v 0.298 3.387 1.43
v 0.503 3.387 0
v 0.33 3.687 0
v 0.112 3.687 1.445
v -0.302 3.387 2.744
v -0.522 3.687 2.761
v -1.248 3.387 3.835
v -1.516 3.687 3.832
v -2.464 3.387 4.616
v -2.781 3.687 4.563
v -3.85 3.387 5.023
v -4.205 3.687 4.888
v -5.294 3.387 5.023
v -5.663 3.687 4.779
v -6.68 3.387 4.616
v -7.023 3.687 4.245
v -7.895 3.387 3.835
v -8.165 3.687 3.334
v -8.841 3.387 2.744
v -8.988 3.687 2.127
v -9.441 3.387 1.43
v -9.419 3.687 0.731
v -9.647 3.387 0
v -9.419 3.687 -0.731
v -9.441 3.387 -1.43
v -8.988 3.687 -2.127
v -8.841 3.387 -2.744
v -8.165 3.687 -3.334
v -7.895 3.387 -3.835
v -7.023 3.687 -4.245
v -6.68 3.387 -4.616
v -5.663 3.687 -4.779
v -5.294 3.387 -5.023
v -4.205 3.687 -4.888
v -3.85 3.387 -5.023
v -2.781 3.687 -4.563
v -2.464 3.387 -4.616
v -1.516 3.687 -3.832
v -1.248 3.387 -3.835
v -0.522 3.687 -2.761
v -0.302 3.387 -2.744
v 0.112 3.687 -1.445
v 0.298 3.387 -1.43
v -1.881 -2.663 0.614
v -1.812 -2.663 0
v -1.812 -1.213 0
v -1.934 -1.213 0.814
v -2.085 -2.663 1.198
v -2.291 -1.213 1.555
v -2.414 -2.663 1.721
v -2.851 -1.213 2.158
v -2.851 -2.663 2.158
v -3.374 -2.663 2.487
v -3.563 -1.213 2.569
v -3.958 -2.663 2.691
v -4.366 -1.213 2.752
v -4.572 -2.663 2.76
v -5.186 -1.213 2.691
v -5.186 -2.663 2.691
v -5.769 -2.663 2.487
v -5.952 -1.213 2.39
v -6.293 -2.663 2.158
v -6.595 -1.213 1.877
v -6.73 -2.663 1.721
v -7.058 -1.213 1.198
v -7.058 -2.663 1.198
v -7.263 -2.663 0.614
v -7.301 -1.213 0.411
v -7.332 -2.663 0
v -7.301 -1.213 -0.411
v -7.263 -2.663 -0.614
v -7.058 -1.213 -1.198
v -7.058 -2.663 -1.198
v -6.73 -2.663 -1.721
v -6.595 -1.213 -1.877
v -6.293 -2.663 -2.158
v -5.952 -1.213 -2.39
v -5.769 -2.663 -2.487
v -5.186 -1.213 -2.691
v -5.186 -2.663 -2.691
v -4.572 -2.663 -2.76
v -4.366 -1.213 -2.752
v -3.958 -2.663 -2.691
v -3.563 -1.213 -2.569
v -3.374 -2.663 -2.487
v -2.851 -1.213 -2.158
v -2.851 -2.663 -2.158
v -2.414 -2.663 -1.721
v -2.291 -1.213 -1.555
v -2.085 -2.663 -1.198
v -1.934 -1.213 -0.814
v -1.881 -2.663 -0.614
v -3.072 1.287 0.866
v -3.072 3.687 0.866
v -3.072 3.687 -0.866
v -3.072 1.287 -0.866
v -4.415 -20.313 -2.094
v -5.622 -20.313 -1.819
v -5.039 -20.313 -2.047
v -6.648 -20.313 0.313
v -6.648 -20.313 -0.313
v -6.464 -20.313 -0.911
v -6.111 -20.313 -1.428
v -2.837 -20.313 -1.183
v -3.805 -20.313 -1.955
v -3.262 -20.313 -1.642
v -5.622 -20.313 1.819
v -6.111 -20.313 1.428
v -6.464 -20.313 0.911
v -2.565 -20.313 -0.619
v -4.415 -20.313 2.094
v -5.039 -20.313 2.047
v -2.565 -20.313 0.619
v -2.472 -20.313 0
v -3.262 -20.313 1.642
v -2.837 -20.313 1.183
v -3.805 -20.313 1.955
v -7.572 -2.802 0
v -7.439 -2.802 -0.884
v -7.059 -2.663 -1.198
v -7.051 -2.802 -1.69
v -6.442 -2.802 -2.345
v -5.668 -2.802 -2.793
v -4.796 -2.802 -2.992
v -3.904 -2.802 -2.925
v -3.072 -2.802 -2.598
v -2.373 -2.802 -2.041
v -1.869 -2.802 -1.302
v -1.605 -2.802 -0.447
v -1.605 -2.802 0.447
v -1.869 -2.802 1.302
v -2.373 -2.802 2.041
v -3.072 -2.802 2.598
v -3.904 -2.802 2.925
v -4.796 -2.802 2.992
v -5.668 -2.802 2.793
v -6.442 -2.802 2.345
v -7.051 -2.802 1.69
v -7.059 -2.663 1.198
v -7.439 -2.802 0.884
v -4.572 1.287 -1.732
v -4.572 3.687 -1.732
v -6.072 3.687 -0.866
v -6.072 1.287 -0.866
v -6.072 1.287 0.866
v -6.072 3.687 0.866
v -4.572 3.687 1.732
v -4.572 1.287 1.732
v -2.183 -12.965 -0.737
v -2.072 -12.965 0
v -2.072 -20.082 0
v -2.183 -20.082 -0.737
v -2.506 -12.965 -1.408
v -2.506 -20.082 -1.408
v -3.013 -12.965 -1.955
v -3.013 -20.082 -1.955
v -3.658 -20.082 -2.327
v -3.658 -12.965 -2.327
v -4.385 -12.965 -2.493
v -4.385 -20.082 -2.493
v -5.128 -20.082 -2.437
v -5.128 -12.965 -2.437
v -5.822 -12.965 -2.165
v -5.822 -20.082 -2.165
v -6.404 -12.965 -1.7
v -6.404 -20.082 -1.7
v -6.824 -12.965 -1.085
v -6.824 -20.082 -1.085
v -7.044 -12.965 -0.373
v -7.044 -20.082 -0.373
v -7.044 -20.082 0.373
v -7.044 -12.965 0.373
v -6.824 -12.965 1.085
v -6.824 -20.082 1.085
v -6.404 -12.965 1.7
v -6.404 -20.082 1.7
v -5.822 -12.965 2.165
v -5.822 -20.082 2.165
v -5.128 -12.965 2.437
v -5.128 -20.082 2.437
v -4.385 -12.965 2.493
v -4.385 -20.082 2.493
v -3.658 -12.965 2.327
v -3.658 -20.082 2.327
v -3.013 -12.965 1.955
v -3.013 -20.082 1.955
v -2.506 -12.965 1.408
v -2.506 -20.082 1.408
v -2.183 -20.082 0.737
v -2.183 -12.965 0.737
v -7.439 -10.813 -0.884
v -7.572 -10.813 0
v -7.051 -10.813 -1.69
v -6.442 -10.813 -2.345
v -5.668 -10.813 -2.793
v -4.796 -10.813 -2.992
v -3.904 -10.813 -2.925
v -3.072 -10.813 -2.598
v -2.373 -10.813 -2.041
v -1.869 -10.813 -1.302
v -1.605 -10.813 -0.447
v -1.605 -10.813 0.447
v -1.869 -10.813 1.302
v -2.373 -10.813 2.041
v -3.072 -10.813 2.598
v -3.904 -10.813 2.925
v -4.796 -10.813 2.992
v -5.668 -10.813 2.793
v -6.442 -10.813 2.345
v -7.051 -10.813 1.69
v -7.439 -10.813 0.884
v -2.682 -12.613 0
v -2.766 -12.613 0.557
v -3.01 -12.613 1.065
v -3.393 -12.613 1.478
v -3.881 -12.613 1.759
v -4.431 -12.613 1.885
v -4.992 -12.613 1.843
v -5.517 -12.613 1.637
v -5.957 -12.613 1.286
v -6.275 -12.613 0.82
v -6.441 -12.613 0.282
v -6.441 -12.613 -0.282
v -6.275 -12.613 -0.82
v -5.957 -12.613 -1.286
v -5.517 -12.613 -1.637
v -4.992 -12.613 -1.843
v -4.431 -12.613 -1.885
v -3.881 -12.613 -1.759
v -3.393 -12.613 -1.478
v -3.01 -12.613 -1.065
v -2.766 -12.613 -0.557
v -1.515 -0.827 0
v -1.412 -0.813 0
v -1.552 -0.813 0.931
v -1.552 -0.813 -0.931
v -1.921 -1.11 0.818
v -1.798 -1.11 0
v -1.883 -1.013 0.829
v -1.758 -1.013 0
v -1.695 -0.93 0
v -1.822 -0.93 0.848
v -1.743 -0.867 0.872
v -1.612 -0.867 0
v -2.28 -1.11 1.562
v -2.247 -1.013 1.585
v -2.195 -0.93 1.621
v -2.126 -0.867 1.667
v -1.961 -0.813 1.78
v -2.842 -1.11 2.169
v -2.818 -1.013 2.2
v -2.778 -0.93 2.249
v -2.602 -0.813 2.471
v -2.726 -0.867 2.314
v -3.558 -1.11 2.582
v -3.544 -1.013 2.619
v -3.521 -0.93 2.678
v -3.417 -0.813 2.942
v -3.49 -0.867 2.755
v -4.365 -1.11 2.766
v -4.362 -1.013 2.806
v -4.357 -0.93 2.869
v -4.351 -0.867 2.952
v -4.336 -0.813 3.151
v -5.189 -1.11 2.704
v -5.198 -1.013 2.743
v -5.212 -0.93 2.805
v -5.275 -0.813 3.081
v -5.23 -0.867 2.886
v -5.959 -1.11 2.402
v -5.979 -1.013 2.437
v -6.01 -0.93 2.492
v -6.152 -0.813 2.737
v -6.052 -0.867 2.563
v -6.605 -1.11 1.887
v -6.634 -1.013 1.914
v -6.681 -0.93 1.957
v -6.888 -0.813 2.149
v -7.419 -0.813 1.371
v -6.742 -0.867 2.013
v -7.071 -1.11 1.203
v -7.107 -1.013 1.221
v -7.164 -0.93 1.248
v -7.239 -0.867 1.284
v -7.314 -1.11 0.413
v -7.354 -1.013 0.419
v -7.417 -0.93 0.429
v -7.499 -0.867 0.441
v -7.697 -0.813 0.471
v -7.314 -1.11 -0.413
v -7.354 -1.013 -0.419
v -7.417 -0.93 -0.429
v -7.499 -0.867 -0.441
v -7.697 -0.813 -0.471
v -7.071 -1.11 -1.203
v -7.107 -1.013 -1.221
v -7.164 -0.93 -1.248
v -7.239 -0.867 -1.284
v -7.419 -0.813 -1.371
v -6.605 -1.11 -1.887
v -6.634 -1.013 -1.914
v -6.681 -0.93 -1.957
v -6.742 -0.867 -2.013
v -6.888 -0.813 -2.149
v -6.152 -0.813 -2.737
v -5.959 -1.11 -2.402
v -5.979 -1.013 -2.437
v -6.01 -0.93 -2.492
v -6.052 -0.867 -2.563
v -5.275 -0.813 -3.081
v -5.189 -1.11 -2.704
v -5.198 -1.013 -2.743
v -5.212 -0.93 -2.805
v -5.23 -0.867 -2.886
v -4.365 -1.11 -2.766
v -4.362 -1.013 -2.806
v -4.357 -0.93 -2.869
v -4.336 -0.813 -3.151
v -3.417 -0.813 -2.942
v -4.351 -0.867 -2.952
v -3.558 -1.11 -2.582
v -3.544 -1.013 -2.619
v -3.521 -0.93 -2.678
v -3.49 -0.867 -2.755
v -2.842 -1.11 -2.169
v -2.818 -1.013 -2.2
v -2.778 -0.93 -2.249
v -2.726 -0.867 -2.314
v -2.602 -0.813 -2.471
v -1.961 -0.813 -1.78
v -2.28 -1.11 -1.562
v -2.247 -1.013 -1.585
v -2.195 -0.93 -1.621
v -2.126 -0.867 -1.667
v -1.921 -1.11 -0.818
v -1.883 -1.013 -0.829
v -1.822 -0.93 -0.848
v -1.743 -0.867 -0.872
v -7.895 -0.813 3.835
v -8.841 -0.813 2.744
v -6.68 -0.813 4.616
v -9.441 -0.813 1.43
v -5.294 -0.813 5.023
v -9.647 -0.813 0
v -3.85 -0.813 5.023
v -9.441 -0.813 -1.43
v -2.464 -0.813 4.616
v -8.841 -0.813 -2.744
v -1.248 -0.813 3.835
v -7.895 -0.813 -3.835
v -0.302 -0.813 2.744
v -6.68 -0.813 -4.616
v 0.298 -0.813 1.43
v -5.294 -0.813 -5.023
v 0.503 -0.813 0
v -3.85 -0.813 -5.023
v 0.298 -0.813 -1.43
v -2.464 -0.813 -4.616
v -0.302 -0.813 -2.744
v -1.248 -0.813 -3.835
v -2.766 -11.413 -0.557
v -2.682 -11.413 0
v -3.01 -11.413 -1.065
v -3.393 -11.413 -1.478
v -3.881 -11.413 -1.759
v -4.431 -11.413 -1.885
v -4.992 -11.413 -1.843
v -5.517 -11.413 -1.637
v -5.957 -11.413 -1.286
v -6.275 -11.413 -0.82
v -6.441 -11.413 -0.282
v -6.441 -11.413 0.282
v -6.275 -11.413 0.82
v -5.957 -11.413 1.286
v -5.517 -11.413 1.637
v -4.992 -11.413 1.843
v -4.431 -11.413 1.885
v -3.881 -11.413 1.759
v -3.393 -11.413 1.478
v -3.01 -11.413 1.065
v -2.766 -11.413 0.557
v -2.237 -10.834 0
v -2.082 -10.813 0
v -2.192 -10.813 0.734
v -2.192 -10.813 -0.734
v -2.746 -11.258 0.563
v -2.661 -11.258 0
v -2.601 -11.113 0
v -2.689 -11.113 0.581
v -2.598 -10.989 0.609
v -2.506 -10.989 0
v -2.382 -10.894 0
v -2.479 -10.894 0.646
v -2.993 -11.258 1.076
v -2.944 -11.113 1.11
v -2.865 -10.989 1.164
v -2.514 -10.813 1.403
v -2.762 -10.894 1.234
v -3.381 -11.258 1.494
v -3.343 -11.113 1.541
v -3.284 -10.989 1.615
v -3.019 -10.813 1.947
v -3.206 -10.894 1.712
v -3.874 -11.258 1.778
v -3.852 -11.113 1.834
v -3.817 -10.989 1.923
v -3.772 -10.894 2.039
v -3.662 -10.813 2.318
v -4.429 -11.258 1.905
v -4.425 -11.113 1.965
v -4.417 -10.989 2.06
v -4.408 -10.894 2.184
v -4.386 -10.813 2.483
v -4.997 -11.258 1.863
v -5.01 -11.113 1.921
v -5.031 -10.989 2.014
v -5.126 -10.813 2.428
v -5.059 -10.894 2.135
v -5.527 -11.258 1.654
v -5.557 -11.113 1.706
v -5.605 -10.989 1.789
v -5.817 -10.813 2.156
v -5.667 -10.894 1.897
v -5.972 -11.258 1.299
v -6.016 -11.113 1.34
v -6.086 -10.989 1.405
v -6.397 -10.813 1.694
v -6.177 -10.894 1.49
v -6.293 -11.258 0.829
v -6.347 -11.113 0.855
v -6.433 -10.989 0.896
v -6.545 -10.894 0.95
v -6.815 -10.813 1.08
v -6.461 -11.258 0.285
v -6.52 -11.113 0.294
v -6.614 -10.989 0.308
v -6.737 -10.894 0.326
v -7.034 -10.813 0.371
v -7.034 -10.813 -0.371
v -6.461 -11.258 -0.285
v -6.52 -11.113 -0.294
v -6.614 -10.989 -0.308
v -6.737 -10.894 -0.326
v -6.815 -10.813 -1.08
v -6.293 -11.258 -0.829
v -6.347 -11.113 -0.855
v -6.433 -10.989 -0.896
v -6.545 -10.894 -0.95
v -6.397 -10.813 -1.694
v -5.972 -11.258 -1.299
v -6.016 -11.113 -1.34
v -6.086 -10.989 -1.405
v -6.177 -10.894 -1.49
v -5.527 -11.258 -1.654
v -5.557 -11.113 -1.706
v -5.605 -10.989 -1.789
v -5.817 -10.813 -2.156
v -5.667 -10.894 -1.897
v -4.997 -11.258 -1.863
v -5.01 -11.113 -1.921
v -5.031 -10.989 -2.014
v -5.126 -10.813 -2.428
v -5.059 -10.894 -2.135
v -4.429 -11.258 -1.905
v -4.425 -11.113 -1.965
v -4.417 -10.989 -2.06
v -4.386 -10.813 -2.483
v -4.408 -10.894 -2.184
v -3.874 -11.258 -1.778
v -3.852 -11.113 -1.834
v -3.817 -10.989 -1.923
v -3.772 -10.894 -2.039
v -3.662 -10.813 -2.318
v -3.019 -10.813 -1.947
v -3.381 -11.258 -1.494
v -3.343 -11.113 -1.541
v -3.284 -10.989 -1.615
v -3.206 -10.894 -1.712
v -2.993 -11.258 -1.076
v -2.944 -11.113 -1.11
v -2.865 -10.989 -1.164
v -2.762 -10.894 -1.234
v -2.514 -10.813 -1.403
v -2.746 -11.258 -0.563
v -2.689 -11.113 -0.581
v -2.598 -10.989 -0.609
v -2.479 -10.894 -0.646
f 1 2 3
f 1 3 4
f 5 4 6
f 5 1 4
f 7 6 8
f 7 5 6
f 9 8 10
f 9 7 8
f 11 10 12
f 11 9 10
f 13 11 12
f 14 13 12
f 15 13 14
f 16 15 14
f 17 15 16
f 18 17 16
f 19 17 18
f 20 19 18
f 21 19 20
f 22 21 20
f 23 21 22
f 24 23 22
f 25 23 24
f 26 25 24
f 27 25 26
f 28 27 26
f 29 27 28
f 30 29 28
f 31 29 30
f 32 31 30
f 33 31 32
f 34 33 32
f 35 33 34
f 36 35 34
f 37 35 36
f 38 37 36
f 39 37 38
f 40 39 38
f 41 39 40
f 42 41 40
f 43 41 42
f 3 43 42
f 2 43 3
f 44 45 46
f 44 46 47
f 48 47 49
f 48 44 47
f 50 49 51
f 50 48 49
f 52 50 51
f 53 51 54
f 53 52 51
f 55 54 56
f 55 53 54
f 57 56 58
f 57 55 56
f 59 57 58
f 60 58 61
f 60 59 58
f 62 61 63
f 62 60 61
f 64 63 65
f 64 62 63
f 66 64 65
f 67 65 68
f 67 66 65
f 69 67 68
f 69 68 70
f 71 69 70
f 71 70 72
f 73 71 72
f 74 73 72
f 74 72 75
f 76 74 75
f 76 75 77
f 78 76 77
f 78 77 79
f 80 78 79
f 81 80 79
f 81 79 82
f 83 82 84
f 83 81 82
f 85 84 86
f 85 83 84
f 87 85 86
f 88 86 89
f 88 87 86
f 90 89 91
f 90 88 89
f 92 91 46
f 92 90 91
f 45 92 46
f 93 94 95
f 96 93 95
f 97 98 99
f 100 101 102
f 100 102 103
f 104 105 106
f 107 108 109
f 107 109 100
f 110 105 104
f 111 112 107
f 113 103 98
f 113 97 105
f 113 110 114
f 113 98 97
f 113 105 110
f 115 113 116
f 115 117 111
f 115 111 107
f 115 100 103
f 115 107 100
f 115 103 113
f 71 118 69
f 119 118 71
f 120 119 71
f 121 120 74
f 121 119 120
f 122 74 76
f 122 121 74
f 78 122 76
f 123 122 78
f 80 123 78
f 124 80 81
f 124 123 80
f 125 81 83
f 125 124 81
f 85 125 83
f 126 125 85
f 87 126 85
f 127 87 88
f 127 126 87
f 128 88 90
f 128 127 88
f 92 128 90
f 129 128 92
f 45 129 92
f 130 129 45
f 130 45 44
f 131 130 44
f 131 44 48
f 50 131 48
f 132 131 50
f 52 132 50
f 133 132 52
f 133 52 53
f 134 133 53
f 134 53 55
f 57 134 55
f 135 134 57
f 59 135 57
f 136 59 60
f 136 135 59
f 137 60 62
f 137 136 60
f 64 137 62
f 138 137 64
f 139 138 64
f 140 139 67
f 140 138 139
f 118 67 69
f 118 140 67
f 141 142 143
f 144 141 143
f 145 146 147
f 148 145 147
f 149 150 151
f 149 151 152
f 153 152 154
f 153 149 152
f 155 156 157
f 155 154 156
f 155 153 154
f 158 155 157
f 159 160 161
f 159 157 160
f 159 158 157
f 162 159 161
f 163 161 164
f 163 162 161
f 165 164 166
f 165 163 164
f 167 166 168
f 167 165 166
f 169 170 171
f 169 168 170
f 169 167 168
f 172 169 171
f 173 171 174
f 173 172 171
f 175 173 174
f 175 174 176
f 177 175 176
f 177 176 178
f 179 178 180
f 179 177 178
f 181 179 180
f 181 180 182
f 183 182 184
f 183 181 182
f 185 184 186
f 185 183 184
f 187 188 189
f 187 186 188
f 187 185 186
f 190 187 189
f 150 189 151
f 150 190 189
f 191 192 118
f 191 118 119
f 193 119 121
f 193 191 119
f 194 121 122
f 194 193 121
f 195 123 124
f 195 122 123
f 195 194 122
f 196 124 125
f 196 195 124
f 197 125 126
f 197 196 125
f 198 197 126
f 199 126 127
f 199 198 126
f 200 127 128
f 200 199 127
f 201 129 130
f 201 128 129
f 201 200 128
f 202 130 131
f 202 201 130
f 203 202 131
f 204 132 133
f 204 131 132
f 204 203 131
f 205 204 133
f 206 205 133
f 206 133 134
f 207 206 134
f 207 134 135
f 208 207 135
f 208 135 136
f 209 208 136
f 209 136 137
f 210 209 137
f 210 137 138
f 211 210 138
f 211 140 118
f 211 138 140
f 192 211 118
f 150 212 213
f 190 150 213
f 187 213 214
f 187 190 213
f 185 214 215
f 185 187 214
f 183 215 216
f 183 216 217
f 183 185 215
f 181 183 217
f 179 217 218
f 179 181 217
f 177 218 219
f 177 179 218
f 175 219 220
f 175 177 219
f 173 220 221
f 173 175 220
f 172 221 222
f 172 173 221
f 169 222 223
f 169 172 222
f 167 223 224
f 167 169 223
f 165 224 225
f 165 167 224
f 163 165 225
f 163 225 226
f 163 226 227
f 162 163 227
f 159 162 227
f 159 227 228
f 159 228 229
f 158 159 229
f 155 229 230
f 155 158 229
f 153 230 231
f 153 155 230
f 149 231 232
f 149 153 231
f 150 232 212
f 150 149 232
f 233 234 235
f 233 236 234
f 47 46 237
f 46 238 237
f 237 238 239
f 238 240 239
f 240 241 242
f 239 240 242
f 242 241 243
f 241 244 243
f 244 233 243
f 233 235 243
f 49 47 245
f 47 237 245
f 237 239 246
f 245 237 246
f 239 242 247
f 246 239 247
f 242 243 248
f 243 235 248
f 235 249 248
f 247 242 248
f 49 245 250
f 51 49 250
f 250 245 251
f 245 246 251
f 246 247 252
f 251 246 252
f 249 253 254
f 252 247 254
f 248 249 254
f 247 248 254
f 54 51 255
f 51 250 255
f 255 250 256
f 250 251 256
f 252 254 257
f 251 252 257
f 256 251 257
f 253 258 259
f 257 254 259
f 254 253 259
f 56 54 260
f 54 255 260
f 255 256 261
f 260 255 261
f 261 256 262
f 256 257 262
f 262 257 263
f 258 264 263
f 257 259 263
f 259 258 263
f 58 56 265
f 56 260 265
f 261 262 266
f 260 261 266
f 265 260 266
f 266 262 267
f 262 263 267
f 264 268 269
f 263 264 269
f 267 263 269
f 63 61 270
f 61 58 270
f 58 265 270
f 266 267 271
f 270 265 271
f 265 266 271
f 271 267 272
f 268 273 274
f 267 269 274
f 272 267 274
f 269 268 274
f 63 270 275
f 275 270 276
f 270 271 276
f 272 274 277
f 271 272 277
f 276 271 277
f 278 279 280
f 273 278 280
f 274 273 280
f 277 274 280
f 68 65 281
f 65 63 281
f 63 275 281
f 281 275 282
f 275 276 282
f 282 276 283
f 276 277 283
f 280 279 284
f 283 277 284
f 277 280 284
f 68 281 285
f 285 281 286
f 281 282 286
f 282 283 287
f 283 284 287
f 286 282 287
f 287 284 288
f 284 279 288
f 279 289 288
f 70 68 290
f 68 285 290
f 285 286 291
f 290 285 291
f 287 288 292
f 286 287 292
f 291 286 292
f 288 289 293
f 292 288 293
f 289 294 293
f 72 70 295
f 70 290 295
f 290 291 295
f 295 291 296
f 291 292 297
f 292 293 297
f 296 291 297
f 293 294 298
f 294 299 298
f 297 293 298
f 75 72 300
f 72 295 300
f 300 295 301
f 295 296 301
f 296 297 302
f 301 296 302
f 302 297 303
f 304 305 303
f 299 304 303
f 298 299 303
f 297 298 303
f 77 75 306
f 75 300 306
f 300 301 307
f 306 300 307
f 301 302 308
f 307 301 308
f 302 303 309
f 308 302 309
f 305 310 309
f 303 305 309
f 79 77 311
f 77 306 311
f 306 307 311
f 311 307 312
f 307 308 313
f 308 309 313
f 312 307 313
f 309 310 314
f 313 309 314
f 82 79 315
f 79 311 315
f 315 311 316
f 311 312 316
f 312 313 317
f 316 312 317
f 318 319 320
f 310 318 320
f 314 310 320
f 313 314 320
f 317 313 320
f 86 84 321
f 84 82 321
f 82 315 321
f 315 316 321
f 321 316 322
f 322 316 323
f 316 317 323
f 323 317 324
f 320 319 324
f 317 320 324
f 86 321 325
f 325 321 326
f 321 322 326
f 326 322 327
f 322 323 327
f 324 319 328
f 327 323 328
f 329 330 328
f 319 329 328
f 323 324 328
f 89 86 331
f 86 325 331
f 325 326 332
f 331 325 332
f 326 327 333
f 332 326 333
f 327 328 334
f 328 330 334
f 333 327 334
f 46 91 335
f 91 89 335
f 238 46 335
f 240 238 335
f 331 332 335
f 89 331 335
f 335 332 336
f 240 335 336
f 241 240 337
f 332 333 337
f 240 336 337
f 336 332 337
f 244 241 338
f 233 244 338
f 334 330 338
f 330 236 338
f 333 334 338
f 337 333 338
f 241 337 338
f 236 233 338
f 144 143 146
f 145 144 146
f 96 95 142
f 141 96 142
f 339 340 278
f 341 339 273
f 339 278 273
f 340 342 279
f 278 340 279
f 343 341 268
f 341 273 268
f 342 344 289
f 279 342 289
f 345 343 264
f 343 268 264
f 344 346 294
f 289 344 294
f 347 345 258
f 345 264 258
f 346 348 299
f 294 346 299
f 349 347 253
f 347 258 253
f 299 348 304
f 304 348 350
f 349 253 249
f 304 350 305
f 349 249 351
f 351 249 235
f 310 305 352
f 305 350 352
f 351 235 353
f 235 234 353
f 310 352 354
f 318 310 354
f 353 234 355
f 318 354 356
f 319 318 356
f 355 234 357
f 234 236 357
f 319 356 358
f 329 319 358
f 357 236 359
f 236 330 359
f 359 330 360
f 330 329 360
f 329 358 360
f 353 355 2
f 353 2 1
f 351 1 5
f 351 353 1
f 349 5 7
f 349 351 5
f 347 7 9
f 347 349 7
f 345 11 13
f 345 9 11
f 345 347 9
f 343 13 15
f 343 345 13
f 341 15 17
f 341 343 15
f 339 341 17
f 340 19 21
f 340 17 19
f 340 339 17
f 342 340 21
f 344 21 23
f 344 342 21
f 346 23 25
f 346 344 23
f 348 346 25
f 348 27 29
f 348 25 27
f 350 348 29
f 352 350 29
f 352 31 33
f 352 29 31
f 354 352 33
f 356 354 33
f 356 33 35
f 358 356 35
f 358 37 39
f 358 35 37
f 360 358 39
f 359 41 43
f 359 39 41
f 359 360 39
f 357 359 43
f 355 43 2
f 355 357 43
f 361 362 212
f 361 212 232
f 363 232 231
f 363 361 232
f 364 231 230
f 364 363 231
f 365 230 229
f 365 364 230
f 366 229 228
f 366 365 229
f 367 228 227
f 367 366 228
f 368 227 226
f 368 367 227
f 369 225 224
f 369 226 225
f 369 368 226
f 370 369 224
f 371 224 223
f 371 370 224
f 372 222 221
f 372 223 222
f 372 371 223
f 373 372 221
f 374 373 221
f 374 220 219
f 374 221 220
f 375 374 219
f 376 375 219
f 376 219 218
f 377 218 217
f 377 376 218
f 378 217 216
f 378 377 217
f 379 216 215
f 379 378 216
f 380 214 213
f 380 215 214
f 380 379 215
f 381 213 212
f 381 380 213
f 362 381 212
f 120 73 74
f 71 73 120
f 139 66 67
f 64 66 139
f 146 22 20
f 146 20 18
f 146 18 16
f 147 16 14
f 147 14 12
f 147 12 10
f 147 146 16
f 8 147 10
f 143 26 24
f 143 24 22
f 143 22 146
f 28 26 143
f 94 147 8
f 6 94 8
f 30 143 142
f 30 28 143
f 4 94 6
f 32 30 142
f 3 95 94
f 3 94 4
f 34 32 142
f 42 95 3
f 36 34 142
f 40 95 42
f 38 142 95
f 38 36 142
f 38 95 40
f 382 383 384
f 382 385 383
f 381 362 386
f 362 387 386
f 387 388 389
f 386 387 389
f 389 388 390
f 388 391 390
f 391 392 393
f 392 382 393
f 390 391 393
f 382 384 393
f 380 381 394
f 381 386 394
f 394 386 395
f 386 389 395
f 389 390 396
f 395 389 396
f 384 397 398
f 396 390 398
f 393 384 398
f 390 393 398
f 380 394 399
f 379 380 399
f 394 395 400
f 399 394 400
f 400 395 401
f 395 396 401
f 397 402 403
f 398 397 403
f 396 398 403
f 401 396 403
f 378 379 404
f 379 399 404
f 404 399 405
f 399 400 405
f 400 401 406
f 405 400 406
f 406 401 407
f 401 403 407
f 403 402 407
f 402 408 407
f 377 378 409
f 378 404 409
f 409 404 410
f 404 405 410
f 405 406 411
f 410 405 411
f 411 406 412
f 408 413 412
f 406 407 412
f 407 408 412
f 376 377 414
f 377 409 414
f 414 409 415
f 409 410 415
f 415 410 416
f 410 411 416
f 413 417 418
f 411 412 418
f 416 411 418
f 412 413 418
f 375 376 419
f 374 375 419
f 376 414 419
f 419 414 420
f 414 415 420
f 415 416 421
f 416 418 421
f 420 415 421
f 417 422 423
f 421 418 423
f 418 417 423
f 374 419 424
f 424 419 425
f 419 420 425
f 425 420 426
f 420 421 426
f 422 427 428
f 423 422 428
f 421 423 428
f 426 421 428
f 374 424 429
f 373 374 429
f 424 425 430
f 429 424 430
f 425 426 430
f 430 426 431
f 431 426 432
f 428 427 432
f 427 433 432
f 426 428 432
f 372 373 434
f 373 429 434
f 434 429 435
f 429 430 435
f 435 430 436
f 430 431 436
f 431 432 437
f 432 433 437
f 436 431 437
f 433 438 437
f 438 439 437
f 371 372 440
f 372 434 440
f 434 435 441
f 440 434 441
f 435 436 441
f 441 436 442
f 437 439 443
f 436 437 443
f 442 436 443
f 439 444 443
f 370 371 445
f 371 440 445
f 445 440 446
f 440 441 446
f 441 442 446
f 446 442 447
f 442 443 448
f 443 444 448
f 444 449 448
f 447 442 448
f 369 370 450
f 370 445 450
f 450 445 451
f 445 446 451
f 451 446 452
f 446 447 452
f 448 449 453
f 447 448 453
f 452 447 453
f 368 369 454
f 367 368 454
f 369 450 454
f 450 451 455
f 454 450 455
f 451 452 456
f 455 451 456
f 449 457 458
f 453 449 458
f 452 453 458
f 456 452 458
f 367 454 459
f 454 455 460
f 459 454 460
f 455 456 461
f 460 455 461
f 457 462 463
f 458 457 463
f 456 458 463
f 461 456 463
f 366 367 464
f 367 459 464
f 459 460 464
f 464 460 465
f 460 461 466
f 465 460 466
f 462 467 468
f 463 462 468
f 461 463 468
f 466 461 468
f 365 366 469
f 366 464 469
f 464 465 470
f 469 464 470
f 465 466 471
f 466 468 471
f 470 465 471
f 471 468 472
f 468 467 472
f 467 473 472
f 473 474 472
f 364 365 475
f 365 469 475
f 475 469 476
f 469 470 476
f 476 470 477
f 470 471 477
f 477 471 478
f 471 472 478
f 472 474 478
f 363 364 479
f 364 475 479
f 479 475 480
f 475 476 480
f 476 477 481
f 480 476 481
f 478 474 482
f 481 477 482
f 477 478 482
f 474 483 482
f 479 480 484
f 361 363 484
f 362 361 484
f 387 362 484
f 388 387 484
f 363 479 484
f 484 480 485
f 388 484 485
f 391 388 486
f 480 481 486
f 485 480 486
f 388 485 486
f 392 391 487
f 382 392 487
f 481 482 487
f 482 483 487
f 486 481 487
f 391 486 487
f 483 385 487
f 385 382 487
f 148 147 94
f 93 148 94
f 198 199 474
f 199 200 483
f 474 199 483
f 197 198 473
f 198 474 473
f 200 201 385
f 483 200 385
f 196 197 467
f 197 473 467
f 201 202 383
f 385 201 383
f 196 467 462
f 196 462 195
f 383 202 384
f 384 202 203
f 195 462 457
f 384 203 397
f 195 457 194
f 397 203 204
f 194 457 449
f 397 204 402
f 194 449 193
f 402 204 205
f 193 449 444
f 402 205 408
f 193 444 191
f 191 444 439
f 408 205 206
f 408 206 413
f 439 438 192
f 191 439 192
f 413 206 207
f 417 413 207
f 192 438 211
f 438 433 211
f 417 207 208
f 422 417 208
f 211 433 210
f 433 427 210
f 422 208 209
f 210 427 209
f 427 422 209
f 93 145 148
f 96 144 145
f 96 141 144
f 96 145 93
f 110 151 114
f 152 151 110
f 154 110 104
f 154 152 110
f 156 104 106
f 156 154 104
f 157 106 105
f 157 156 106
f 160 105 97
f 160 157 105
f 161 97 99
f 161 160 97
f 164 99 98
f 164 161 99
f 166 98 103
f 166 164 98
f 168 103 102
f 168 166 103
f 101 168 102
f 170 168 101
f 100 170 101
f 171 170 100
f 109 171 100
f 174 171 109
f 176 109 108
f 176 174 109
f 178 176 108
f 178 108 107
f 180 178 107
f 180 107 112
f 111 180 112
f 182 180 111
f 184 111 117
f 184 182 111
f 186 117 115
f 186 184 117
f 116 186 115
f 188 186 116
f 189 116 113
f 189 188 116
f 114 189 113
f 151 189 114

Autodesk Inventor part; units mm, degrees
ref_plane "YZ Plane" through (0, 0, 0) normal (1, 0, 0) x (0, 1, 0)
ref_plane "XZ Plane" through (0, 0, 0) normal (0, 1, 0) x (-1, 0, 0)
ref_plane "XY Plane" through (0, 0, 0) normal (0, 0, 1) x (1, 0, 0)
sketch "Sketch1" plane through (0, 0, 0) normal (0, 0, 1) x (1, 0, 0)
  line L0 (-4.5718, -2.6632) -> (-7.5718, -2.6632)
  line L1 (-7.5718, -2.6632) -> (-7.5718, -10.8132)
  line L2 (-7.5718, -10.8132) -> (-4.5718, -10.8132)
  line L3 (-4.5718, -10.8132) -> (-4.5718, -2.6632)
  dimension "d1" = 8.15
  dimension "d2" = 3
revolve "Shoulder" add sketch "Sketch1" angle 360 about axis through (-4.5718, -10.8132, 0) along (0, 1, 0)
sketch "Sketch2" plane through (-4.5718, -2.6632, 0) normal (0, 1, 0) x (1, 0, 0)
  circle A0 centre (0, 0) radius 3 projected
  circle A1 centre (0, 0) radius 2.76
  dimension "d3" = 5.52
extrude "Shoulder_neck" add sketch "Sketch2" along normal blind 1.85 contours A1
sketch "Sketch3" plane through (-4.5718, -0.8132, 0) normal (0, 1, 0) x (1, 0, 0)
  circle A0 centre (0, 0) radius 2.76 projected
  circle A1 centre (0, 0) radius 5.075
  dimension "d6" = 10.15
extrude "Head" add sketch "Sketch3" along normal blind 4.5 contours A0 | A1
sketch "Sketch4" plane through (-4.5718, -10.8132, 0) normal (0, -1, 0) x (1, 0, 0)
  circle A0 centre (0, 0) radius 3 projected
  circle A1 centre (0, 0) radius 1.89
  dimension "d9" = 3.78
extrude "Thread_neck" add sketch "Sketch4" along normal blind 1.8 contours A1
sketch "Sketch5" plane through (-4.5718, -12.6132, 0) normal (0, -1, 0) x (1, 0, 0)
  circle A0 centre (0, 0) radius 1.89 projected
  circle A1 centre (0, 0) radius 2.5
  dimension "d12" = 5
extrude "Thread_shoulder" add sketch "Sketch5" along normal blind 7.7 contours A0 | A1
sketch "Sketch6" plane through (-4.5718, 3.6868, 0) normal (0, 1, 0) x (1, 0, 0)
  circle A0 centre (0, 0) radius 5.075 projected
  circle A1 centre (0, 0) radius 1.5 construction
  line L0 (-1.5, 0.866) -> (-1.5, -0.866)
  line L1 (-1.5, -0.866) -> (0, -1.7321)
  line L2 (0, -1.7321) -> (1.5, -0.866)
  line L3 (1.5, -0.866) -> (1.5, 0.866)
  line L4 (1.5, 0.866) -> (0, 1.7321)
  line L5 (0, 1.7321) -> (-1.5, 0.866)
  dimension "d15" = 3
extrude "Hex" cut sketch "Sketch6" against normal blind 2.4 contours L5 L4 L3 L2 L1 L0
chamfer "Chamfer1" distance 0.24 angle 30 1 edges at (-1.5718, -2.6632, 0) measured on face at (-7.436, -2.6632, -0.4595)
fillet "Fillet1" radius 0.4 1 edges at (-7.3318, -0.8132, 0)
chamfer "Chamfer2" distance 0.3 angle 30 1 edges at (-9.6468, 3.6868, 0) measured on face at (0.4867, 2.1868, 0.4084)
chamfer "Chamfer3" distance 0.4 angle 30 1 edges at (-7.0718, -20.3132, 0) measured on face at (-3.3106, -20.3132, -0.6619)
fillet "Fillet2" radius 0.6 1 edges at (-6.4618, -10.8132, 0)
chamfer "Chamfer7" distance 0.61 angle 30 1 edges at (-7.0718, -12.6132, 0) measured on face at (-2.3177, -12.6132, -0.3502)
thread "Thread" size "M5x0.8" class "6g" standard "ANSI Metric M Profile" full length
equation "\"d1\" = Shoulder_length - Shoulder_neck_length"
equation "\"d2\" = 0.5 * Shoulder_diameter"
equation "\"d3\" = Shoulder_neck_dia"
equation "\"d4\" = Shoulder_neck_length"
equation "\"d6\" = Head_diameter"
equation "\"d7\" = Head_height"
equation "\"d9\" = Thread_neck_dia"
equation "\"d10\" = Thread_neck_length"
equation "\"d12\" = Thread_diameter"
equation "\"d13\" = Thread_length - Thread_neck_length"
equation "\"d15\" = Hex_size"
equation "\"d16\" = Hex_length"
equation "\"d18\" = -0.5 * Shoulder_neck_dia + 0.5 * Shoulder_diameter"
equation "\"d64\" = -0.5 * Shoulder_neck_dia + 0.5 * Shoulder_diameter"
equation "\"d21\" = 0.1 * Hex_size"
equation "\"d65\" = 0.1 * Hex_size"
equation "\"d23\" = 0.5 * Thread_pitch"
equation "\"d66\" = 0.5 * Thread_pitch"
equation "\"d25\" = Thread_neck_radius"
equation "\"d60\" = -0.5 * Thread_neck_dia + 0.5 * Thread_diameter"
equation "\"d67\" = -0.5 * Thread_neck_dia + 0.5 * Thread_diameter"
equation "\"Shoulder_diameter\" = 6"
equation "\"Shoulder_length\" = 10"
equation "\"Shoulder_neck_dia\" = 5.52"
equation "\"Thread_diameter\" = 5"
equation "\"Thread_length\" = 9.5"
equation "\"Head_diameter\" = 10.15"
equation "\"Head_height\" = 4.5"
equation "\"Thread_neck_dia\" = 3.78"
equation "\"Hex_size\" = 3"
equation "\"Hex_length\" = 2.4"
equation "\"Thread_pitch\" = 0.8"
equation "\"Shoulder_neck_length\" = 1.85"
equation "\"Thread_neck_length\" = 1.8"
equation "\"Thread_neck_radius\" = 0.6"
properties part number "SCREW, SHOULDER, P, 12.9,  M6X10MM" material "Steel, High Strength Low Alloy"
